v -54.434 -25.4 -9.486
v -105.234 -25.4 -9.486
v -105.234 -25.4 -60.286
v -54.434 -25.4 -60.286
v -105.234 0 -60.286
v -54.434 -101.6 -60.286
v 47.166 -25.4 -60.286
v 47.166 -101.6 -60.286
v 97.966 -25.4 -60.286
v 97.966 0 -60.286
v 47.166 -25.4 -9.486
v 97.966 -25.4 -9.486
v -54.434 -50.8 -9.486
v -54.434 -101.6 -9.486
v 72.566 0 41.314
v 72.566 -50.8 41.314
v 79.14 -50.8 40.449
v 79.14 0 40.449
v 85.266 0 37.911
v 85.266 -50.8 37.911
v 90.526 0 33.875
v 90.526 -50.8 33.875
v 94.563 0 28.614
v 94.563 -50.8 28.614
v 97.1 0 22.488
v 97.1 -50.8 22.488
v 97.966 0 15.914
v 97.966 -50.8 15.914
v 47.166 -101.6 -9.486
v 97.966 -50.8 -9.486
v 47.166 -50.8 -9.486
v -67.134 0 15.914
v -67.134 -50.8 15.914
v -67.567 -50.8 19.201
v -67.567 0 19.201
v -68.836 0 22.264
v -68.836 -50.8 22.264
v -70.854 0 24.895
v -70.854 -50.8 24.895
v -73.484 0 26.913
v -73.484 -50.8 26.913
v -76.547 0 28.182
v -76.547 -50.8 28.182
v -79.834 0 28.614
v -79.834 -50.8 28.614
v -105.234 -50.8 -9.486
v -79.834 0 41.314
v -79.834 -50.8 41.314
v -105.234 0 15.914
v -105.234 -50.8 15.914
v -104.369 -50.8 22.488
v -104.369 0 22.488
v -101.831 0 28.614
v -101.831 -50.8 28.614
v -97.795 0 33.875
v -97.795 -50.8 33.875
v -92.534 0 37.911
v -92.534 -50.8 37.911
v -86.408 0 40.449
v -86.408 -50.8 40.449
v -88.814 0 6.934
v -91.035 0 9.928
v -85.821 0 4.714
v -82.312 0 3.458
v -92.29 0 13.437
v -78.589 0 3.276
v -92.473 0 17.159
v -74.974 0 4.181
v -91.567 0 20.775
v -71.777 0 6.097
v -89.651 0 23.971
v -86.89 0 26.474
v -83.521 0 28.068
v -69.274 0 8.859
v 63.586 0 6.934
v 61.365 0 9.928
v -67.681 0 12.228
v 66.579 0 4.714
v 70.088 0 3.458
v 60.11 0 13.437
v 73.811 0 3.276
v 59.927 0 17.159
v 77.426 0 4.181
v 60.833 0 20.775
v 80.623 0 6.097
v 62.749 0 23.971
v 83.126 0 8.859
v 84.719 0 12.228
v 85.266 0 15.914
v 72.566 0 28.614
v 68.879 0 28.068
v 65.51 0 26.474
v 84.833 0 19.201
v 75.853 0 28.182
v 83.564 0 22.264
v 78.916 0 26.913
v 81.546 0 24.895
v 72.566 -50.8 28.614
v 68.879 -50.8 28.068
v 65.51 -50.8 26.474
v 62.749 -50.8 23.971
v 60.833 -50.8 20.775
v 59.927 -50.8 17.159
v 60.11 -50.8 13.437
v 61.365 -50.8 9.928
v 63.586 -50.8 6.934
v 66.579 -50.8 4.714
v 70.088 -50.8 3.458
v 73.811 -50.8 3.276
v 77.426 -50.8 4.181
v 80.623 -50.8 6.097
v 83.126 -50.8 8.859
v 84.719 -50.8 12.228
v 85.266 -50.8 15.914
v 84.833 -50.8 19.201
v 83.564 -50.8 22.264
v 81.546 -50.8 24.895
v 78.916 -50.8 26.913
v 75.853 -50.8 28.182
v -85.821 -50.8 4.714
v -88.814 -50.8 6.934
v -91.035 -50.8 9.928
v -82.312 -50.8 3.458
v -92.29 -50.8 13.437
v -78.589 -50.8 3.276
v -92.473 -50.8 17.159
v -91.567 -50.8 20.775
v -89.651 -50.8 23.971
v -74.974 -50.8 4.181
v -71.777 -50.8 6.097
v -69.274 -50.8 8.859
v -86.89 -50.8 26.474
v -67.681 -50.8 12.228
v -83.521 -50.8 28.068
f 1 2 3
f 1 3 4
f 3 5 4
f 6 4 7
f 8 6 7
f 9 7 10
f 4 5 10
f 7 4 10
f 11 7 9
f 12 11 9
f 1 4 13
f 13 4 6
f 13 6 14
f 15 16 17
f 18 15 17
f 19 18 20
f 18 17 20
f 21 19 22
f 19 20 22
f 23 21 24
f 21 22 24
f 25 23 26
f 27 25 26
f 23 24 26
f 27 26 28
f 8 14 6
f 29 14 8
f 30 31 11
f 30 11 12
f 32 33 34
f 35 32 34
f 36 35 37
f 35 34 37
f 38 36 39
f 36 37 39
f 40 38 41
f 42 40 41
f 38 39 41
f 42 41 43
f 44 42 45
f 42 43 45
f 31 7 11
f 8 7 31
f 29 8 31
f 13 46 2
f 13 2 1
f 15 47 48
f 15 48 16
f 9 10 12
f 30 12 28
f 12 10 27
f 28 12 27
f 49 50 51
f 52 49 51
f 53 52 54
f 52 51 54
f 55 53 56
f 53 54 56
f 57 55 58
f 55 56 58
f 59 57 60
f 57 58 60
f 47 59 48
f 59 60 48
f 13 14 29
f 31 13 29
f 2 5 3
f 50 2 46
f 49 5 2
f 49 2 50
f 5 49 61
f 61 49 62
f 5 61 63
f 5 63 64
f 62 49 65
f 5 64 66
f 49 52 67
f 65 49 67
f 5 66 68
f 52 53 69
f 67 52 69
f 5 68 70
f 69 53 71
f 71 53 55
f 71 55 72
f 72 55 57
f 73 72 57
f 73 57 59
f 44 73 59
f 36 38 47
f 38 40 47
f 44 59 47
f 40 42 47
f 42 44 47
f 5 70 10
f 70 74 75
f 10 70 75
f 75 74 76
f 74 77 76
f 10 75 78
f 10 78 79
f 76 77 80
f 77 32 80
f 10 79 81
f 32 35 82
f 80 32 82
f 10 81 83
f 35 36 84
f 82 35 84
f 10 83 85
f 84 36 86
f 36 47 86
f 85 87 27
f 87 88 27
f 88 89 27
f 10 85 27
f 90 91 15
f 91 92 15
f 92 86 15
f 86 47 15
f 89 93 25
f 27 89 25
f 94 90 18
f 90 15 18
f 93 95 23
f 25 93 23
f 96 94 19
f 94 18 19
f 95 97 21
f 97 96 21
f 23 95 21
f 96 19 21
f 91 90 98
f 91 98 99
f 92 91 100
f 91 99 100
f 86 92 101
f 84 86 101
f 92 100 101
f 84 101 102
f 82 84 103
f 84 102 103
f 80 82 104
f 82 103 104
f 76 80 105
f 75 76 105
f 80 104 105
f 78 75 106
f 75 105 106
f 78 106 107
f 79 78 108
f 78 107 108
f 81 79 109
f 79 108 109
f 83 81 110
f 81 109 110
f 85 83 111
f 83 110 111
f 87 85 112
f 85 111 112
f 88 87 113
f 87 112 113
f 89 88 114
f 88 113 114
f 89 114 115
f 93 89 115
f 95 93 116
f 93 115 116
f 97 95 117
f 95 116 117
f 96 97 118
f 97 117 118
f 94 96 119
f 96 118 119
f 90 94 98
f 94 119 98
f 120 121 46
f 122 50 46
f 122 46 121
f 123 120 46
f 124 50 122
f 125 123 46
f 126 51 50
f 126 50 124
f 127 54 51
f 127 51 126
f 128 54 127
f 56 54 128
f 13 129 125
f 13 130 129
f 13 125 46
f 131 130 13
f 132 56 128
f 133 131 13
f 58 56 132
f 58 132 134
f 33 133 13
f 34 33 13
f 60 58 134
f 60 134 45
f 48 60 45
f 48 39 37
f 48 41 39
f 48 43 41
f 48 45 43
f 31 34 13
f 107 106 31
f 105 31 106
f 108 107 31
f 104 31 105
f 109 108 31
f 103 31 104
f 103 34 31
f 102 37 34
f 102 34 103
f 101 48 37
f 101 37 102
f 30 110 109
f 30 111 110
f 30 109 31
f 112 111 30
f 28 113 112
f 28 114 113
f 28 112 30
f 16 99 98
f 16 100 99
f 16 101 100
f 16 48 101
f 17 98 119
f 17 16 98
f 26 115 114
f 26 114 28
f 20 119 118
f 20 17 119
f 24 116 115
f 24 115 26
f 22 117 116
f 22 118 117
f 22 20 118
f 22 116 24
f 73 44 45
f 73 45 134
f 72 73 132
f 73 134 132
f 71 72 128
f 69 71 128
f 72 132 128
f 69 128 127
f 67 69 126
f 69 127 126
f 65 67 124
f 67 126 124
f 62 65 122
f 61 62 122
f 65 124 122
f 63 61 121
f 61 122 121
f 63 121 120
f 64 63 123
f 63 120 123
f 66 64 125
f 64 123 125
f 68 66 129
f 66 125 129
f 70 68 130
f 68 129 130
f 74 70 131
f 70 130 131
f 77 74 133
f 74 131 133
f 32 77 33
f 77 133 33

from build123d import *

# Parameters (mm, degrees)
F0_W      = 203.2
F0_H      = 101.6
F1_DEPTH  = 101.6
F2_W      = 50.8
F2_H      = 50.8
F3_DEPTH  = 76.2
F4_W      = 50.8
F4_H      = 50.8
F5_DEPTH  = 76.2
F7_DEPTH  = 101.6
F9_DEPTH  = 101.6
F11_DEPTH = 101.6
F13_DEPTH = 101.6
F14_W     = 203.2
F14_H     = 50.8
F15_DEPTH = 50.8


with BuildPart() as f1:
    # F0 (on Front) → F1 (new body)
    with BuildSketch(Plane.XZ):
        with Locations((-3.634136, -9.485549)):
            Rectangle(F0_W, F0_H)
    extrude(amount=F1_DEPTH)

    # F2 (on face) → F3 (cut)
    with BuildSketch(Plane.XZ.offset(101.6)):
        with Locations((72.565864, -34.885549)):
            Rectangle(F2_W, F2_H)
    extrude(amount=-F3_DEPTH, mode=Mode.SUBTRACT)

    # F4 (on face) → F5 (cut)
    with BuildSketch(Plane.XZ.offset(101.6)):
        with Locations((-79.834136, -34.885549)):
            Rectangle(F4_W, F4_H)
    extrude(amount=-F5_DEPTH, mode=Mode.SUBTRACT)

    # F6 (on face) → F7 (cut)
    with BuildSketch(Plane.XZ.offset(101.6)):
        with BuildLine():
            Line((97.965864, 15.914451), (97.965864, 41.314451))
            Line((97.965864, 41.314451), (72.565864, 41.314451))
            ThreePointArc((72.565864, 41.314451), (90.526376, 33.874963), (97.965864, 15.914451))
        make_face()
    extrude(amount=-F7_DEPTH, mode=Mode.SUBTRACT)

    # F8 (on face) → F9 (cut)
    with BuildSketch(Plane.XZ.offset(101.6)):
        with BuildLine():
            Line((-79.834136, 41.314451), (-105.234136, 41.314451))
            Line((-105.234136, 41.314451), (-105.234136, 15.914451))
            ThreePointArc((-105.234136, 15.914451), (-97.794648, 33.874963), (-79.834136, 41.314451))
        make_face()
    extrude(amount=-F9_DEPTH, mode=Mode.SUBTRACT)

    # F10 (on face) → F11 (cut)
    with BuildSketch(Plane.XZ.offset(101.6)):
        with BuildLine():
            ThreePointArc((85.265864, 15.914451), (81.54612, 24.894707), (72.565864, 28.614451))
            ThreePointArc((72.565864, 28.614451), (63.585608, 6.934195), (85.265864, 15.914451))
        make_face()
    extrude(amount=-F11_DEPTH, mode=Mode.SUBTRACT)

    # F12 (on face) → F13 (cut)
    with BuildSketch(Plane.XZ.offset(101.6)):
        with BuildLine():
            ThreePointArc((-67.134136, 15.914451), (-70.85388, 24.894707), (-79.834136, 28.614451))
            ThreePointArc((-79.834136, 28.614451), (-88.814392, 6.934195), (-67.134136, 15.914451))
        make_face()
    extrude(amount=-F13_DEPTH, mode=Mode.SUBTRACT)

    # F14 (on face) → F15 (cut)
    with BuildSketch(Plane.XZ.offset(101.6)):
        with Locations((-3.634136, 15.914451)):
            Rectangle(F14_W, F14_H)
    extrude(amount=-F15_DEPTH, mode=Mode.SUBTRACT)


solid = f1.part
